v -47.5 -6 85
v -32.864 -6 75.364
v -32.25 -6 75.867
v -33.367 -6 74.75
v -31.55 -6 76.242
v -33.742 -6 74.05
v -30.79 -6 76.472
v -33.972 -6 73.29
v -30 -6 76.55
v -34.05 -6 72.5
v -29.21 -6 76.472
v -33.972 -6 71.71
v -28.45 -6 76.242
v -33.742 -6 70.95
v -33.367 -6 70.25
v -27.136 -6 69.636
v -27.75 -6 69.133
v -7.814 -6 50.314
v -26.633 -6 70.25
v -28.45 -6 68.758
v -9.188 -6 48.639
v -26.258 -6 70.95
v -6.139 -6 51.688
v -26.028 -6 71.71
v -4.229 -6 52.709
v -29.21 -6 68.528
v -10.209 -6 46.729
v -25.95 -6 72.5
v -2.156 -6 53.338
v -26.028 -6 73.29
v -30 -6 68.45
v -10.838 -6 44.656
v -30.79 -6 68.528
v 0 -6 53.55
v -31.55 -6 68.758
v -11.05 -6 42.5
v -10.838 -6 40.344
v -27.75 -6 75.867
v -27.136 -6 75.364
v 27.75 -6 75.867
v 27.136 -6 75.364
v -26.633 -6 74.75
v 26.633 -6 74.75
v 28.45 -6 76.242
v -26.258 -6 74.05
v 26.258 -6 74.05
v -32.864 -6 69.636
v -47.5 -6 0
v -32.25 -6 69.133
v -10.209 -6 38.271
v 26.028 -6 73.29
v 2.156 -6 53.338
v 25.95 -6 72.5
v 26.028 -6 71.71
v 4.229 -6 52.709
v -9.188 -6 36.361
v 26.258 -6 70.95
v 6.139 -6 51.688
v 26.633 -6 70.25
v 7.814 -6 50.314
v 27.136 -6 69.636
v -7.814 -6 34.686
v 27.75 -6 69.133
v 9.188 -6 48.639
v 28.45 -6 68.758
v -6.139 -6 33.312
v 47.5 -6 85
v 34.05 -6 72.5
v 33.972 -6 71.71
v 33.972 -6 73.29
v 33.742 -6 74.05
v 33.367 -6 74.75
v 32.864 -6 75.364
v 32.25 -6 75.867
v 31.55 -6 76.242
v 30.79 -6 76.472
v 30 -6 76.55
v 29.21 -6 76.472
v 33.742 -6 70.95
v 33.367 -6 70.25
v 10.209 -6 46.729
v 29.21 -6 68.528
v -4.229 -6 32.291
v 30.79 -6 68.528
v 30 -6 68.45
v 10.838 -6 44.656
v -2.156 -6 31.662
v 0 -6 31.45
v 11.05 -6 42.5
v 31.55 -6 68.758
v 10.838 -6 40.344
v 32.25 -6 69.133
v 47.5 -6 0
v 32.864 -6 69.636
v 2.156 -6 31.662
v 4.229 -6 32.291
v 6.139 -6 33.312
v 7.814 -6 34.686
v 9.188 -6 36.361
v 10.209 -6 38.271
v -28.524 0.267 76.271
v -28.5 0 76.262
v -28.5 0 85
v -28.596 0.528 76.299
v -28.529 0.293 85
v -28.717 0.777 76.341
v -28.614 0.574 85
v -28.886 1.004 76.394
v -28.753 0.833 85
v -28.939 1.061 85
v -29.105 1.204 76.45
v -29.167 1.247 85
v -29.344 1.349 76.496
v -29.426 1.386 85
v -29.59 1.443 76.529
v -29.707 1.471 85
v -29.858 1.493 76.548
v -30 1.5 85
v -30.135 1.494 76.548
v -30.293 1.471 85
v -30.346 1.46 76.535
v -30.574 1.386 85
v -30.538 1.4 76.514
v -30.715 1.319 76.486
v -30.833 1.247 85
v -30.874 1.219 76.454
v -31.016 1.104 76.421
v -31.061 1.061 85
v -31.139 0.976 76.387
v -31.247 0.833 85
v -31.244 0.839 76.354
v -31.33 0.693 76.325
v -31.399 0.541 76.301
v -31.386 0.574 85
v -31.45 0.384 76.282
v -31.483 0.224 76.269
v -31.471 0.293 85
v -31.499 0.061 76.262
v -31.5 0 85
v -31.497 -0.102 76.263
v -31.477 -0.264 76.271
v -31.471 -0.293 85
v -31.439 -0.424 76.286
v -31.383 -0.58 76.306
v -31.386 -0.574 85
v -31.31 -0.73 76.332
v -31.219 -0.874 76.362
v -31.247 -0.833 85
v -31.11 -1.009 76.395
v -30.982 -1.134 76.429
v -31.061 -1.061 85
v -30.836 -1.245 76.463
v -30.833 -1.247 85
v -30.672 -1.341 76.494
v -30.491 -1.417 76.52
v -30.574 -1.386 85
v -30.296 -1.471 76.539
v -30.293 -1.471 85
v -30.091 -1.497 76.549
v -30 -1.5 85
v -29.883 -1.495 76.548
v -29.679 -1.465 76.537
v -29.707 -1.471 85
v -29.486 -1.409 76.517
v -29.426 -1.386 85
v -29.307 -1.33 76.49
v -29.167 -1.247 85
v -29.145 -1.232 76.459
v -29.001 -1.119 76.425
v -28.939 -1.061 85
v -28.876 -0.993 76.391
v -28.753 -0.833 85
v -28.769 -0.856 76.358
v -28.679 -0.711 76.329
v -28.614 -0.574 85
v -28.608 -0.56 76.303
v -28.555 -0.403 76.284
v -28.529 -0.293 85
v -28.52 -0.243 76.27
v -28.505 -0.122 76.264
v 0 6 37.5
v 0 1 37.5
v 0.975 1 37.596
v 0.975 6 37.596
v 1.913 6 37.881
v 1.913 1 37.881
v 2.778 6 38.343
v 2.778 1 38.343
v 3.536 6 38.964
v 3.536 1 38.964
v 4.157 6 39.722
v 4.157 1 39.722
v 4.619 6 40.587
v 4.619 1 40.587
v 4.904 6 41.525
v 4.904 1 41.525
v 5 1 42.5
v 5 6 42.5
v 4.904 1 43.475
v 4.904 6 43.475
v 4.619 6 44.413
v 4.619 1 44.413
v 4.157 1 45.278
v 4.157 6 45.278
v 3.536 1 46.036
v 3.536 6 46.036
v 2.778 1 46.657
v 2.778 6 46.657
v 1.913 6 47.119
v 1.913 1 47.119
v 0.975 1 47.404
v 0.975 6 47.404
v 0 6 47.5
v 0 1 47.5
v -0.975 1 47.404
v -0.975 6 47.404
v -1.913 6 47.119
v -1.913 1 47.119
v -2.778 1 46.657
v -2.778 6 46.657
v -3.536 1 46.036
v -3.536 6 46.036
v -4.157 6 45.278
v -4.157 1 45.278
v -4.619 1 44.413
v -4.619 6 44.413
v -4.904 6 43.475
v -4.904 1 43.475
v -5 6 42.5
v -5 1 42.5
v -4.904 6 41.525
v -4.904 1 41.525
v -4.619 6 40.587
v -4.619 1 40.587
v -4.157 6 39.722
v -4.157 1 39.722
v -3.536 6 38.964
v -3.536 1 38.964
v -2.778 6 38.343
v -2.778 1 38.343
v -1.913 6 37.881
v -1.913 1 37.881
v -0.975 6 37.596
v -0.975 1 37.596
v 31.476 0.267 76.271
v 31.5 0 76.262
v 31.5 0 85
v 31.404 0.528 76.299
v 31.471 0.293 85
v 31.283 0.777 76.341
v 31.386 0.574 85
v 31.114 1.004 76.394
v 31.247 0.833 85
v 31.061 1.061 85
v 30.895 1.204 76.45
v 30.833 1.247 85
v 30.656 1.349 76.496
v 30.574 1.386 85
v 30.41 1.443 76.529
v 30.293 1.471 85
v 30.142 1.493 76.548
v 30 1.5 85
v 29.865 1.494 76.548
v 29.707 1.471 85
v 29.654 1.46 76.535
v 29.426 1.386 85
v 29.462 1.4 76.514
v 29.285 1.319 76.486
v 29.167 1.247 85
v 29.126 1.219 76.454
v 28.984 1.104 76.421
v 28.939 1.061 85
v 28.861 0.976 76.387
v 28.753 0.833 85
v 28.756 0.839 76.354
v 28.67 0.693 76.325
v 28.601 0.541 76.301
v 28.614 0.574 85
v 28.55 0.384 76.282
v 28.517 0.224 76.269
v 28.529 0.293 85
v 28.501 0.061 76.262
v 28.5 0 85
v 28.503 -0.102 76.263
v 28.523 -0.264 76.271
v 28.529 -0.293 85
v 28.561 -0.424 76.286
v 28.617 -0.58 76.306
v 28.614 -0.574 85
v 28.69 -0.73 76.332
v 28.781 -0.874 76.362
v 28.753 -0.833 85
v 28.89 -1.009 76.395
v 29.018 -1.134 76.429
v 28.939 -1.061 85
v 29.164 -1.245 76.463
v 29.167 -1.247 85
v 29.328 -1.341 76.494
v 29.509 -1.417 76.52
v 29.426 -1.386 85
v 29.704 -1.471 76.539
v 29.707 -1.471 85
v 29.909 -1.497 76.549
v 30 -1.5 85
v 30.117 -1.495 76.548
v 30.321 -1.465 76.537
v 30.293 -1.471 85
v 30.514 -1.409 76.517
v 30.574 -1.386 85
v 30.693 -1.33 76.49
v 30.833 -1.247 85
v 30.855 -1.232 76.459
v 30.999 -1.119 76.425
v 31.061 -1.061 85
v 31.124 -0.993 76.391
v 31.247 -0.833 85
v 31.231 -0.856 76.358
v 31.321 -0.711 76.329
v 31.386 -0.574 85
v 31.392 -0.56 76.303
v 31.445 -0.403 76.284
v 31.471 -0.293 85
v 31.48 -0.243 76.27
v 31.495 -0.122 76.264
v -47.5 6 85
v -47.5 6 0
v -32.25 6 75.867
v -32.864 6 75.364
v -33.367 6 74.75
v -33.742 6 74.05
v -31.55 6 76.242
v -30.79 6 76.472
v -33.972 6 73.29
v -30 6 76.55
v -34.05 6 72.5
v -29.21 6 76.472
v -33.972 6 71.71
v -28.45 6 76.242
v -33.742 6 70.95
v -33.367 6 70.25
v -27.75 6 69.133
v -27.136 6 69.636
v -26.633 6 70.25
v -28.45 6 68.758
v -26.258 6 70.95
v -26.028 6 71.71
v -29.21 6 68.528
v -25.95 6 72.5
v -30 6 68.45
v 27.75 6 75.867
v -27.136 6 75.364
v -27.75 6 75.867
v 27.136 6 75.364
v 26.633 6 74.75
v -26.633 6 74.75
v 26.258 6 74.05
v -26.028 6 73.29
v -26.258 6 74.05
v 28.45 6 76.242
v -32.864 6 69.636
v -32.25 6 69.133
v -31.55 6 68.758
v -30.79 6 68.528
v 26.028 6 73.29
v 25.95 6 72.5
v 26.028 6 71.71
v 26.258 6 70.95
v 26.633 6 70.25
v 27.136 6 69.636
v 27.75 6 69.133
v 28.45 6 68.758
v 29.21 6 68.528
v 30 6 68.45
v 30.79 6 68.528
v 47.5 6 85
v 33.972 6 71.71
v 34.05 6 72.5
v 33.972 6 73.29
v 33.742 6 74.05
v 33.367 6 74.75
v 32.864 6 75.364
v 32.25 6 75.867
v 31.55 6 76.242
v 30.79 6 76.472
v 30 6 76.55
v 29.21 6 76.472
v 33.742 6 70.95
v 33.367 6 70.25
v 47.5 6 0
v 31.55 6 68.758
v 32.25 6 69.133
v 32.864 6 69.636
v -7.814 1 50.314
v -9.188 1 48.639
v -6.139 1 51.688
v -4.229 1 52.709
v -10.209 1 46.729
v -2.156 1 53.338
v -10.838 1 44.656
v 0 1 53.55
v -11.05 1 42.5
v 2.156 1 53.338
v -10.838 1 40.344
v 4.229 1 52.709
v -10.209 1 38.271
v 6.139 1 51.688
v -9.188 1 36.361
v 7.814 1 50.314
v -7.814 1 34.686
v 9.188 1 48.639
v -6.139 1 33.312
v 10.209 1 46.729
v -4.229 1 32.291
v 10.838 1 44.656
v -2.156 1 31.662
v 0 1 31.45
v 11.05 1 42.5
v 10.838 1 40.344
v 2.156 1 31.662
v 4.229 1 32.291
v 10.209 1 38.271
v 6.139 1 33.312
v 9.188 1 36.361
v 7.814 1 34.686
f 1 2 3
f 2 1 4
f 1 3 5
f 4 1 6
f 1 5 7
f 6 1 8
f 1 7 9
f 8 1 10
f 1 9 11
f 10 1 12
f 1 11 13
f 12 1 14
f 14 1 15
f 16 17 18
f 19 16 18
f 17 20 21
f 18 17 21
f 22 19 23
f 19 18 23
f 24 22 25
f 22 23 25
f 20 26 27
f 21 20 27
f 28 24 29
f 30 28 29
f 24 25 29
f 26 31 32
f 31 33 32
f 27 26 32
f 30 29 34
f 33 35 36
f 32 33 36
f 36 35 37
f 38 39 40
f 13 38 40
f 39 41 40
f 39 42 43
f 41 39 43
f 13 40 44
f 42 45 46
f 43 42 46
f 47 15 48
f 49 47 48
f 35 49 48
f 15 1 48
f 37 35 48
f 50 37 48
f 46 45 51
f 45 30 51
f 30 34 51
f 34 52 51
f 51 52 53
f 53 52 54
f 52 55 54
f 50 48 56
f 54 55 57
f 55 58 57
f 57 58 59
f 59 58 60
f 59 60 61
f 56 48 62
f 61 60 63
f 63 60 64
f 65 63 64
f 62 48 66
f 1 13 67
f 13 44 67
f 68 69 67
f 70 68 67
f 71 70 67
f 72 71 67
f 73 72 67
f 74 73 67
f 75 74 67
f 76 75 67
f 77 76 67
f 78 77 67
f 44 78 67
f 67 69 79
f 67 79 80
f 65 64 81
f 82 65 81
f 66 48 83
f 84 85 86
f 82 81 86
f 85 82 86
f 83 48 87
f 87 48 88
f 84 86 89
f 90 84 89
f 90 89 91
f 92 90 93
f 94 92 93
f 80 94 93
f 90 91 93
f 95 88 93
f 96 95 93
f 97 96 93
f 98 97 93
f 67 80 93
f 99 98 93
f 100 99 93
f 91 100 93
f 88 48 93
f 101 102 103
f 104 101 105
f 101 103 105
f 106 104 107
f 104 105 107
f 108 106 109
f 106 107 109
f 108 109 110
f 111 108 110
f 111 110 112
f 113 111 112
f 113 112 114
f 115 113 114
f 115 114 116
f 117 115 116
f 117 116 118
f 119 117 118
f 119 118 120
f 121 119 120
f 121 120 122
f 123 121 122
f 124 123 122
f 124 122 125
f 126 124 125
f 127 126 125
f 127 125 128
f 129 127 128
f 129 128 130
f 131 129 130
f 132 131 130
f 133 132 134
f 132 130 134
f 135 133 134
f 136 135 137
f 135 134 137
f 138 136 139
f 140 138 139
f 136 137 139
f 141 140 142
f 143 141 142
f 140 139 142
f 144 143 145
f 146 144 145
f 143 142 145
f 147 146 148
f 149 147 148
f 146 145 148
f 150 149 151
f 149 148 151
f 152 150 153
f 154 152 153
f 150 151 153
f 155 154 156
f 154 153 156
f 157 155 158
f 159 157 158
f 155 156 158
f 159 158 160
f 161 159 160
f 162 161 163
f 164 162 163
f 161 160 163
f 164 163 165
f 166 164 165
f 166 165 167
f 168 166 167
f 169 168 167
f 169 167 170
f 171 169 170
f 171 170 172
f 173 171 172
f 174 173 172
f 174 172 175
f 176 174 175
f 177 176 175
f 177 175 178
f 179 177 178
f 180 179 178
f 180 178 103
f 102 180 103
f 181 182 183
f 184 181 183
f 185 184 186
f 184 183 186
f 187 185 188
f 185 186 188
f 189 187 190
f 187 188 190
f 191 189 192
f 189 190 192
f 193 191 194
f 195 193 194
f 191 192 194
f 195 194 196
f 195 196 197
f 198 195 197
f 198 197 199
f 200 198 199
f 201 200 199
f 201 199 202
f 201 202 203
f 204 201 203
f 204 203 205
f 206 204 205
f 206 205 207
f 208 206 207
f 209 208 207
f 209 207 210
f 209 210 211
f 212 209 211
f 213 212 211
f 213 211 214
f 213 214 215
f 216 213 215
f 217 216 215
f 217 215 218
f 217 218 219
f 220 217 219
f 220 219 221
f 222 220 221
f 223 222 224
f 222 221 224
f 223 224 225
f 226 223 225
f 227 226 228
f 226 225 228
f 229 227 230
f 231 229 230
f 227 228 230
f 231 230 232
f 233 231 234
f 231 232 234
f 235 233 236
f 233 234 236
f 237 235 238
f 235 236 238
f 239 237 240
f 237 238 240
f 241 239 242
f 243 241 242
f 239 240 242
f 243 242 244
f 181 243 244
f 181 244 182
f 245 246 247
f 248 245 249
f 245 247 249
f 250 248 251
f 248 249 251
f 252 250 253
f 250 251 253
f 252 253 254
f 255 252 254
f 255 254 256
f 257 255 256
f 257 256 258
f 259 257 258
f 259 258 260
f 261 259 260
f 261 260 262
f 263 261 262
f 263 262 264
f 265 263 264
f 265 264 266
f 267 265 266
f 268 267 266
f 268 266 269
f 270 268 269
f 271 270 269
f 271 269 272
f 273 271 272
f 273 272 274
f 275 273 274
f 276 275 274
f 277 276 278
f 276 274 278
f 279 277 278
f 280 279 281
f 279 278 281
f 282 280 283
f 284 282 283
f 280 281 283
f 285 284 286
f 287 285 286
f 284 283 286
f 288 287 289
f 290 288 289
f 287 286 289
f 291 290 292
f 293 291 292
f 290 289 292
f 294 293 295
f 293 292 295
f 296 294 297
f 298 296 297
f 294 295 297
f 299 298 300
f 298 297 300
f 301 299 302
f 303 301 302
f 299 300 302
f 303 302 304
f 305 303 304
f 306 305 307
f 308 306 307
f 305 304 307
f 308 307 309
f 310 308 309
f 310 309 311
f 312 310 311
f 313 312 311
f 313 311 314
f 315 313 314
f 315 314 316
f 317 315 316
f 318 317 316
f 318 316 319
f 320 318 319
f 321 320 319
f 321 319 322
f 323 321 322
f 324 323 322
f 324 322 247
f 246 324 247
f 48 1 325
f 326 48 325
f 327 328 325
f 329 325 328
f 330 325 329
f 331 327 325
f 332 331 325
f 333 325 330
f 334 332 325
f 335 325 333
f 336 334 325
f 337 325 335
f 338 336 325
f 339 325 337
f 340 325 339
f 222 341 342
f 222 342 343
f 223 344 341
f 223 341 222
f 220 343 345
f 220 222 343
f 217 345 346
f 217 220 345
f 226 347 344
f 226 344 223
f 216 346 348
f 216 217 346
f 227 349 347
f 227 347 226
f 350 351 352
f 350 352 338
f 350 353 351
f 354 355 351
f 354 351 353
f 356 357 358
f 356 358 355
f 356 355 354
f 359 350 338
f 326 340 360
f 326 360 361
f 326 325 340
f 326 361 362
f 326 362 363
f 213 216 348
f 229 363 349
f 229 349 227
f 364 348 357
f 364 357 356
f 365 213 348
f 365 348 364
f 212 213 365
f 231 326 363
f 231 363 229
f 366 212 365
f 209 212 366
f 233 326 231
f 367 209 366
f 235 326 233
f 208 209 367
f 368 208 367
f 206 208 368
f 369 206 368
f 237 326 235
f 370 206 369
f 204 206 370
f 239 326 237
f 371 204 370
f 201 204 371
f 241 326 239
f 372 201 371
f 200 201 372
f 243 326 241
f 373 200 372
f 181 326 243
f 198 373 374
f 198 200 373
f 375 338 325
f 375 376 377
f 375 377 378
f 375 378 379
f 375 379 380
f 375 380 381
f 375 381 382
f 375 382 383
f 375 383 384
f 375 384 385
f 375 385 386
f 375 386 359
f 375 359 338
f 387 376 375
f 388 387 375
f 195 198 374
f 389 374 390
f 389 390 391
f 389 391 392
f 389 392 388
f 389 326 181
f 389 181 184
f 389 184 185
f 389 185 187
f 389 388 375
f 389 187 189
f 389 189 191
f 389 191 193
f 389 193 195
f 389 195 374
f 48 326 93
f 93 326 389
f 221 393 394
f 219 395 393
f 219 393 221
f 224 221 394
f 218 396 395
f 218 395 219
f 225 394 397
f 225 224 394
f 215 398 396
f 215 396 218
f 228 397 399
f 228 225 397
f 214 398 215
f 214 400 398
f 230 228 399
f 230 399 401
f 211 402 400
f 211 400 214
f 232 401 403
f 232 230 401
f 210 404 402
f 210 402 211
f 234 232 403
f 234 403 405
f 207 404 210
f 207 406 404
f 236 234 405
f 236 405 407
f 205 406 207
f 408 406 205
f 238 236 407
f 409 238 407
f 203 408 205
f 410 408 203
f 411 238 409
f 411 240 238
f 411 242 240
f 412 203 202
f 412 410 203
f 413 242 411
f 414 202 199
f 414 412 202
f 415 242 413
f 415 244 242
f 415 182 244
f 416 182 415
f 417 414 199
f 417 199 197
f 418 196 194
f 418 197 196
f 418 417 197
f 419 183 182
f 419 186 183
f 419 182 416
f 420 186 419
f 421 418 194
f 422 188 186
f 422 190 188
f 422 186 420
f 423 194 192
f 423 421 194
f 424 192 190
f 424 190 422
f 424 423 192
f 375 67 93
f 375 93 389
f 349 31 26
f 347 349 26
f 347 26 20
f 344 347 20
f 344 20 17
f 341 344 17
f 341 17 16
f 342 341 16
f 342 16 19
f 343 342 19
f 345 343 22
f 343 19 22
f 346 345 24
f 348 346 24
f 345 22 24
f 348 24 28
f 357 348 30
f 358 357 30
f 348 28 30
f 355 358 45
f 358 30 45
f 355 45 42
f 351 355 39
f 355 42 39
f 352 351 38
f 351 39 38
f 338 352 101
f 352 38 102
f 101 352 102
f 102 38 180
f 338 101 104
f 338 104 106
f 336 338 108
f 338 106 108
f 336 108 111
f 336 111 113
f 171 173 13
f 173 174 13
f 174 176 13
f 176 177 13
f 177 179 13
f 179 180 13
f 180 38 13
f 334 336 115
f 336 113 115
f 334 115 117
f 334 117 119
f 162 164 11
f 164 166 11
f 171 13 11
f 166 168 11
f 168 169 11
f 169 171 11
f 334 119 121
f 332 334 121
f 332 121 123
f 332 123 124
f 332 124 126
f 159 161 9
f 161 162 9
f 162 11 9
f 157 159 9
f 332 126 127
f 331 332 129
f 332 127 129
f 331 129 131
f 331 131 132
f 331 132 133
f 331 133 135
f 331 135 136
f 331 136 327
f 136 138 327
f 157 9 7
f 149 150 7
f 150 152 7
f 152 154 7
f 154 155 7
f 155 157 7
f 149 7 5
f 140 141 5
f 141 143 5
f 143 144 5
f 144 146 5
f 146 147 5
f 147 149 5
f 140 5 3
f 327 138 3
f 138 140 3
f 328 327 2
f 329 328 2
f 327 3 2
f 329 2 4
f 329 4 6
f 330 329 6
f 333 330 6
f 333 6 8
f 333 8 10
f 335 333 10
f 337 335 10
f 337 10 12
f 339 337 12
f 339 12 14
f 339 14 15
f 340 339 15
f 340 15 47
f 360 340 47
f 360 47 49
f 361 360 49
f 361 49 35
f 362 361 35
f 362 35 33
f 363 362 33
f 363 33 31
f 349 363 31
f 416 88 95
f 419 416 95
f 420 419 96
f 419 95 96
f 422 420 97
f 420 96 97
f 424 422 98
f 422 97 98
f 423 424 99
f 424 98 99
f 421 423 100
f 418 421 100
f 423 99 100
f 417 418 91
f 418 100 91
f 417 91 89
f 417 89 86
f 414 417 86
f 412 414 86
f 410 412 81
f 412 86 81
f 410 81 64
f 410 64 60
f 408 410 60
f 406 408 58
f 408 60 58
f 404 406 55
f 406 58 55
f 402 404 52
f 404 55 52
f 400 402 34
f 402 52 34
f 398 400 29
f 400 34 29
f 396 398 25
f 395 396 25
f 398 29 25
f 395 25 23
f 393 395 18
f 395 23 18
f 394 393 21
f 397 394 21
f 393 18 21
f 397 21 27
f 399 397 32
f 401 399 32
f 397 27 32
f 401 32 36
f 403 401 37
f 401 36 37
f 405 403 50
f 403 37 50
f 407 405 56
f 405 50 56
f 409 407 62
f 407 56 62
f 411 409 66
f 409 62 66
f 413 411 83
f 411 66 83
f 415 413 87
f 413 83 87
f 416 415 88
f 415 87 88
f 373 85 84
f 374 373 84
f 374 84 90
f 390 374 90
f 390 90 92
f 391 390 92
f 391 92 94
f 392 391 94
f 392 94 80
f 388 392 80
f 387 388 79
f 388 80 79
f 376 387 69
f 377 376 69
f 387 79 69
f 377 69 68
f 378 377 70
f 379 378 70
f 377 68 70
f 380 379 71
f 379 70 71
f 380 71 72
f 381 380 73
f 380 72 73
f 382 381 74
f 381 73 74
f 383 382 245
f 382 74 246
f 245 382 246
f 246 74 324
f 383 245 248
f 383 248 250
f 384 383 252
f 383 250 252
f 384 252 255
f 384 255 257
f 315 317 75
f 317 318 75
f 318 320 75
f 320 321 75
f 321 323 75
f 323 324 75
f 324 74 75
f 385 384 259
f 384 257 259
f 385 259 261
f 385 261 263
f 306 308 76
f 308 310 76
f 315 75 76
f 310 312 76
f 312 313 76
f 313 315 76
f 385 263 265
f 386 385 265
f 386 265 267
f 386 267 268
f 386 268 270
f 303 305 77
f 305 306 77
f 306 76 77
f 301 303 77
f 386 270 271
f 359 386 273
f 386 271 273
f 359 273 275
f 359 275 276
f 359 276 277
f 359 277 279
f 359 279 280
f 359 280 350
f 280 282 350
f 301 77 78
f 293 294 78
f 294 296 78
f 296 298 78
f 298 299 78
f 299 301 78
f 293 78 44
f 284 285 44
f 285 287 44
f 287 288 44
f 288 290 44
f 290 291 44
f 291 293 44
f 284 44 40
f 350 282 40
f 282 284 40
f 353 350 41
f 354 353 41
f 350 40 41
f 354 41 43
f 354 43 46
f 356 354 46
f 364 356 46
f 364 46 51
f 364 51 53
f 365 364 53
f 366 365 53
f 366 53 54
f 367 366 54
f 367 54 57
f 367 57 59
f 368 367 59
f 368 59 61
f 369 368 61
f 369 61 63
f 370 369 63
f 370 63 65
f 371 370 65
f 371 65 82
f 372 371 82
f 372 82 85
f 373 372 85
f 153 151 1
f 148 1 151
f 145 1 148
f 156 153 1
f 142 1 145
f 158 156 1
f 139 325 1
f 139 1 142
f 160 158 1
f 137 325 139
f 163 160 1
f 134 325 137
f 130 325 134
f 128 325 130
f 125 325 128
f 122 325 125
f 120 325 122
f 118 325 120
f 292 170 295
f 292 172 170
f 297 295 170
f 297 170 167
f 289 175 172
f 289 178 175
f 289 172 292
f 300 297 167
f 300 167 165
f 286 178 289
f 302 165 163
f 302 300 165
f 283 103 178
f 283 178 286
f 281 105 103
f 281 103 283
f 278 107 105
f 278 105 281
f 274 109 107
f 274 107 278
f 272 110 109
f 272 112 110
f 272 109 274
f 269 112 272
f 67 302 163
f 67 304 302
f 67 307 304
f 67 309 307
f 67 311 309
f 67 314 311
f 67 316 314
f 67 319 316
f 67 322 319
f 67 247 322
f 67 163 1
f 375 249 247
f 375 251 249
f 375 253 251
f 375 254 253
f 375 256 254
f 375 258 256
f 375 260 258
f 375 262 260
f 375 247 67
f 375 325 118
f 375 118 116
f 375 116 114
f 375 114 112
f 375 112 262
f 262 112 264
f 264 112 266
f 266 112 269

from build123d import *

# Parameters (mm, degrees)
SKETCH1_W           = 95
SKETCH1_H           = 12
BOSS_EXTRUDE1_DEPTH = 85
SKETCH2_R           = 4.05
SKETCH2_R_2         = 5
CUT_EXTRUDE1_DEPTH  = 13
SKETCH3_R           = 11.05
CUT_EXTRUDE2_DEPTH  = 7
CUT_EXTRUDE3_REACH  = 87
SKETCH4_R           = 1.5


with BuildPart() as part:
    # Sketch1 → Boss-Extrude1 (new body)
    with BuildSketch(Plane.XY):
        Rectangle(SKETCH1_W, SKETCH1_H)
    extrude(amount=BOSS_EXTRUDE1_DEPTH)

    # Sketch2 → Cut-Extrude1 (cut, through all)
    with BuildSketch(Plane.XZ.offset(6)):
        with Locations(Location((-30, 72.5, 0), (0, 0, 270))):  # turned: the seam where the file's is
            Circle(SKETCH2_R)
        with Locations(Location((30, 72.5, 0), (0, 0, 270))):  # turned: the seam where the file's is
            Circle(SKETCH2_R)
        with Locations(Location((0, 42.5, 0), (0, 0, 270))):  # turned: the seam where the file's is
            Circle(SKETCH2_R_2)
    extrude(amount=-CUT_EXTRUDE1_DEPTH, mode=Mode.SUBTRACT)

    # Sketch3 → Cut-Extrude2 (cut)
    with BuildSketch(Plane.XZ.offset(6)):
        with Locations(Location((0, 42.5, 0), (0, 0, 270))):  # turned: the seam where the file's is
            Circle(SKETCH3_R)
    extrude(amount=-CUT_EXTRUDE2_DEPTH, mode=Mode.SUBTRACT)

    # Sketch4 → Cut-Extrude3 (cut, up to next)
    with BuildSketch(Plane.XY.offset(85), mode=Mode.PRIVATE) as cut_extrude3_sk1:
        with Locations((30, 0)):
            Circle(SKETCH4_R)
    cut_extrude3_tool1 = extrude(cut_extrude3_sk1.sketch, amount=-CUT_EXTRUDE3_REACH, mode=Mode.PRIVATE) & part.part
    add(cut_extrude3_tool1.solids().sort_by_distance((30, 0, 85))[0], mode=Mode.SUBTRACT)
    # Sketch4 → Cut-Extrude3 (cut, up to next)
    with BuildSketch(Plane.XY.offset(85), mode=Mode.PRIVATE) as cut_extrude3_sk2:
        with Locations((-30, 0)):
            Circle(SKETCH4_R)
    cut_extrude3_tool2 = extrude(cut_extrude3_sk2.sketch, amount=-CUT_EXTRUDE3_REACH, mode=Mode.PRIVATE) & part.part
    add(cut_extrude3_tool2.solids().sort_by_distance((-30, 0, 85))[0], mode=Mode.SUBTRACT)


solid = part.part
